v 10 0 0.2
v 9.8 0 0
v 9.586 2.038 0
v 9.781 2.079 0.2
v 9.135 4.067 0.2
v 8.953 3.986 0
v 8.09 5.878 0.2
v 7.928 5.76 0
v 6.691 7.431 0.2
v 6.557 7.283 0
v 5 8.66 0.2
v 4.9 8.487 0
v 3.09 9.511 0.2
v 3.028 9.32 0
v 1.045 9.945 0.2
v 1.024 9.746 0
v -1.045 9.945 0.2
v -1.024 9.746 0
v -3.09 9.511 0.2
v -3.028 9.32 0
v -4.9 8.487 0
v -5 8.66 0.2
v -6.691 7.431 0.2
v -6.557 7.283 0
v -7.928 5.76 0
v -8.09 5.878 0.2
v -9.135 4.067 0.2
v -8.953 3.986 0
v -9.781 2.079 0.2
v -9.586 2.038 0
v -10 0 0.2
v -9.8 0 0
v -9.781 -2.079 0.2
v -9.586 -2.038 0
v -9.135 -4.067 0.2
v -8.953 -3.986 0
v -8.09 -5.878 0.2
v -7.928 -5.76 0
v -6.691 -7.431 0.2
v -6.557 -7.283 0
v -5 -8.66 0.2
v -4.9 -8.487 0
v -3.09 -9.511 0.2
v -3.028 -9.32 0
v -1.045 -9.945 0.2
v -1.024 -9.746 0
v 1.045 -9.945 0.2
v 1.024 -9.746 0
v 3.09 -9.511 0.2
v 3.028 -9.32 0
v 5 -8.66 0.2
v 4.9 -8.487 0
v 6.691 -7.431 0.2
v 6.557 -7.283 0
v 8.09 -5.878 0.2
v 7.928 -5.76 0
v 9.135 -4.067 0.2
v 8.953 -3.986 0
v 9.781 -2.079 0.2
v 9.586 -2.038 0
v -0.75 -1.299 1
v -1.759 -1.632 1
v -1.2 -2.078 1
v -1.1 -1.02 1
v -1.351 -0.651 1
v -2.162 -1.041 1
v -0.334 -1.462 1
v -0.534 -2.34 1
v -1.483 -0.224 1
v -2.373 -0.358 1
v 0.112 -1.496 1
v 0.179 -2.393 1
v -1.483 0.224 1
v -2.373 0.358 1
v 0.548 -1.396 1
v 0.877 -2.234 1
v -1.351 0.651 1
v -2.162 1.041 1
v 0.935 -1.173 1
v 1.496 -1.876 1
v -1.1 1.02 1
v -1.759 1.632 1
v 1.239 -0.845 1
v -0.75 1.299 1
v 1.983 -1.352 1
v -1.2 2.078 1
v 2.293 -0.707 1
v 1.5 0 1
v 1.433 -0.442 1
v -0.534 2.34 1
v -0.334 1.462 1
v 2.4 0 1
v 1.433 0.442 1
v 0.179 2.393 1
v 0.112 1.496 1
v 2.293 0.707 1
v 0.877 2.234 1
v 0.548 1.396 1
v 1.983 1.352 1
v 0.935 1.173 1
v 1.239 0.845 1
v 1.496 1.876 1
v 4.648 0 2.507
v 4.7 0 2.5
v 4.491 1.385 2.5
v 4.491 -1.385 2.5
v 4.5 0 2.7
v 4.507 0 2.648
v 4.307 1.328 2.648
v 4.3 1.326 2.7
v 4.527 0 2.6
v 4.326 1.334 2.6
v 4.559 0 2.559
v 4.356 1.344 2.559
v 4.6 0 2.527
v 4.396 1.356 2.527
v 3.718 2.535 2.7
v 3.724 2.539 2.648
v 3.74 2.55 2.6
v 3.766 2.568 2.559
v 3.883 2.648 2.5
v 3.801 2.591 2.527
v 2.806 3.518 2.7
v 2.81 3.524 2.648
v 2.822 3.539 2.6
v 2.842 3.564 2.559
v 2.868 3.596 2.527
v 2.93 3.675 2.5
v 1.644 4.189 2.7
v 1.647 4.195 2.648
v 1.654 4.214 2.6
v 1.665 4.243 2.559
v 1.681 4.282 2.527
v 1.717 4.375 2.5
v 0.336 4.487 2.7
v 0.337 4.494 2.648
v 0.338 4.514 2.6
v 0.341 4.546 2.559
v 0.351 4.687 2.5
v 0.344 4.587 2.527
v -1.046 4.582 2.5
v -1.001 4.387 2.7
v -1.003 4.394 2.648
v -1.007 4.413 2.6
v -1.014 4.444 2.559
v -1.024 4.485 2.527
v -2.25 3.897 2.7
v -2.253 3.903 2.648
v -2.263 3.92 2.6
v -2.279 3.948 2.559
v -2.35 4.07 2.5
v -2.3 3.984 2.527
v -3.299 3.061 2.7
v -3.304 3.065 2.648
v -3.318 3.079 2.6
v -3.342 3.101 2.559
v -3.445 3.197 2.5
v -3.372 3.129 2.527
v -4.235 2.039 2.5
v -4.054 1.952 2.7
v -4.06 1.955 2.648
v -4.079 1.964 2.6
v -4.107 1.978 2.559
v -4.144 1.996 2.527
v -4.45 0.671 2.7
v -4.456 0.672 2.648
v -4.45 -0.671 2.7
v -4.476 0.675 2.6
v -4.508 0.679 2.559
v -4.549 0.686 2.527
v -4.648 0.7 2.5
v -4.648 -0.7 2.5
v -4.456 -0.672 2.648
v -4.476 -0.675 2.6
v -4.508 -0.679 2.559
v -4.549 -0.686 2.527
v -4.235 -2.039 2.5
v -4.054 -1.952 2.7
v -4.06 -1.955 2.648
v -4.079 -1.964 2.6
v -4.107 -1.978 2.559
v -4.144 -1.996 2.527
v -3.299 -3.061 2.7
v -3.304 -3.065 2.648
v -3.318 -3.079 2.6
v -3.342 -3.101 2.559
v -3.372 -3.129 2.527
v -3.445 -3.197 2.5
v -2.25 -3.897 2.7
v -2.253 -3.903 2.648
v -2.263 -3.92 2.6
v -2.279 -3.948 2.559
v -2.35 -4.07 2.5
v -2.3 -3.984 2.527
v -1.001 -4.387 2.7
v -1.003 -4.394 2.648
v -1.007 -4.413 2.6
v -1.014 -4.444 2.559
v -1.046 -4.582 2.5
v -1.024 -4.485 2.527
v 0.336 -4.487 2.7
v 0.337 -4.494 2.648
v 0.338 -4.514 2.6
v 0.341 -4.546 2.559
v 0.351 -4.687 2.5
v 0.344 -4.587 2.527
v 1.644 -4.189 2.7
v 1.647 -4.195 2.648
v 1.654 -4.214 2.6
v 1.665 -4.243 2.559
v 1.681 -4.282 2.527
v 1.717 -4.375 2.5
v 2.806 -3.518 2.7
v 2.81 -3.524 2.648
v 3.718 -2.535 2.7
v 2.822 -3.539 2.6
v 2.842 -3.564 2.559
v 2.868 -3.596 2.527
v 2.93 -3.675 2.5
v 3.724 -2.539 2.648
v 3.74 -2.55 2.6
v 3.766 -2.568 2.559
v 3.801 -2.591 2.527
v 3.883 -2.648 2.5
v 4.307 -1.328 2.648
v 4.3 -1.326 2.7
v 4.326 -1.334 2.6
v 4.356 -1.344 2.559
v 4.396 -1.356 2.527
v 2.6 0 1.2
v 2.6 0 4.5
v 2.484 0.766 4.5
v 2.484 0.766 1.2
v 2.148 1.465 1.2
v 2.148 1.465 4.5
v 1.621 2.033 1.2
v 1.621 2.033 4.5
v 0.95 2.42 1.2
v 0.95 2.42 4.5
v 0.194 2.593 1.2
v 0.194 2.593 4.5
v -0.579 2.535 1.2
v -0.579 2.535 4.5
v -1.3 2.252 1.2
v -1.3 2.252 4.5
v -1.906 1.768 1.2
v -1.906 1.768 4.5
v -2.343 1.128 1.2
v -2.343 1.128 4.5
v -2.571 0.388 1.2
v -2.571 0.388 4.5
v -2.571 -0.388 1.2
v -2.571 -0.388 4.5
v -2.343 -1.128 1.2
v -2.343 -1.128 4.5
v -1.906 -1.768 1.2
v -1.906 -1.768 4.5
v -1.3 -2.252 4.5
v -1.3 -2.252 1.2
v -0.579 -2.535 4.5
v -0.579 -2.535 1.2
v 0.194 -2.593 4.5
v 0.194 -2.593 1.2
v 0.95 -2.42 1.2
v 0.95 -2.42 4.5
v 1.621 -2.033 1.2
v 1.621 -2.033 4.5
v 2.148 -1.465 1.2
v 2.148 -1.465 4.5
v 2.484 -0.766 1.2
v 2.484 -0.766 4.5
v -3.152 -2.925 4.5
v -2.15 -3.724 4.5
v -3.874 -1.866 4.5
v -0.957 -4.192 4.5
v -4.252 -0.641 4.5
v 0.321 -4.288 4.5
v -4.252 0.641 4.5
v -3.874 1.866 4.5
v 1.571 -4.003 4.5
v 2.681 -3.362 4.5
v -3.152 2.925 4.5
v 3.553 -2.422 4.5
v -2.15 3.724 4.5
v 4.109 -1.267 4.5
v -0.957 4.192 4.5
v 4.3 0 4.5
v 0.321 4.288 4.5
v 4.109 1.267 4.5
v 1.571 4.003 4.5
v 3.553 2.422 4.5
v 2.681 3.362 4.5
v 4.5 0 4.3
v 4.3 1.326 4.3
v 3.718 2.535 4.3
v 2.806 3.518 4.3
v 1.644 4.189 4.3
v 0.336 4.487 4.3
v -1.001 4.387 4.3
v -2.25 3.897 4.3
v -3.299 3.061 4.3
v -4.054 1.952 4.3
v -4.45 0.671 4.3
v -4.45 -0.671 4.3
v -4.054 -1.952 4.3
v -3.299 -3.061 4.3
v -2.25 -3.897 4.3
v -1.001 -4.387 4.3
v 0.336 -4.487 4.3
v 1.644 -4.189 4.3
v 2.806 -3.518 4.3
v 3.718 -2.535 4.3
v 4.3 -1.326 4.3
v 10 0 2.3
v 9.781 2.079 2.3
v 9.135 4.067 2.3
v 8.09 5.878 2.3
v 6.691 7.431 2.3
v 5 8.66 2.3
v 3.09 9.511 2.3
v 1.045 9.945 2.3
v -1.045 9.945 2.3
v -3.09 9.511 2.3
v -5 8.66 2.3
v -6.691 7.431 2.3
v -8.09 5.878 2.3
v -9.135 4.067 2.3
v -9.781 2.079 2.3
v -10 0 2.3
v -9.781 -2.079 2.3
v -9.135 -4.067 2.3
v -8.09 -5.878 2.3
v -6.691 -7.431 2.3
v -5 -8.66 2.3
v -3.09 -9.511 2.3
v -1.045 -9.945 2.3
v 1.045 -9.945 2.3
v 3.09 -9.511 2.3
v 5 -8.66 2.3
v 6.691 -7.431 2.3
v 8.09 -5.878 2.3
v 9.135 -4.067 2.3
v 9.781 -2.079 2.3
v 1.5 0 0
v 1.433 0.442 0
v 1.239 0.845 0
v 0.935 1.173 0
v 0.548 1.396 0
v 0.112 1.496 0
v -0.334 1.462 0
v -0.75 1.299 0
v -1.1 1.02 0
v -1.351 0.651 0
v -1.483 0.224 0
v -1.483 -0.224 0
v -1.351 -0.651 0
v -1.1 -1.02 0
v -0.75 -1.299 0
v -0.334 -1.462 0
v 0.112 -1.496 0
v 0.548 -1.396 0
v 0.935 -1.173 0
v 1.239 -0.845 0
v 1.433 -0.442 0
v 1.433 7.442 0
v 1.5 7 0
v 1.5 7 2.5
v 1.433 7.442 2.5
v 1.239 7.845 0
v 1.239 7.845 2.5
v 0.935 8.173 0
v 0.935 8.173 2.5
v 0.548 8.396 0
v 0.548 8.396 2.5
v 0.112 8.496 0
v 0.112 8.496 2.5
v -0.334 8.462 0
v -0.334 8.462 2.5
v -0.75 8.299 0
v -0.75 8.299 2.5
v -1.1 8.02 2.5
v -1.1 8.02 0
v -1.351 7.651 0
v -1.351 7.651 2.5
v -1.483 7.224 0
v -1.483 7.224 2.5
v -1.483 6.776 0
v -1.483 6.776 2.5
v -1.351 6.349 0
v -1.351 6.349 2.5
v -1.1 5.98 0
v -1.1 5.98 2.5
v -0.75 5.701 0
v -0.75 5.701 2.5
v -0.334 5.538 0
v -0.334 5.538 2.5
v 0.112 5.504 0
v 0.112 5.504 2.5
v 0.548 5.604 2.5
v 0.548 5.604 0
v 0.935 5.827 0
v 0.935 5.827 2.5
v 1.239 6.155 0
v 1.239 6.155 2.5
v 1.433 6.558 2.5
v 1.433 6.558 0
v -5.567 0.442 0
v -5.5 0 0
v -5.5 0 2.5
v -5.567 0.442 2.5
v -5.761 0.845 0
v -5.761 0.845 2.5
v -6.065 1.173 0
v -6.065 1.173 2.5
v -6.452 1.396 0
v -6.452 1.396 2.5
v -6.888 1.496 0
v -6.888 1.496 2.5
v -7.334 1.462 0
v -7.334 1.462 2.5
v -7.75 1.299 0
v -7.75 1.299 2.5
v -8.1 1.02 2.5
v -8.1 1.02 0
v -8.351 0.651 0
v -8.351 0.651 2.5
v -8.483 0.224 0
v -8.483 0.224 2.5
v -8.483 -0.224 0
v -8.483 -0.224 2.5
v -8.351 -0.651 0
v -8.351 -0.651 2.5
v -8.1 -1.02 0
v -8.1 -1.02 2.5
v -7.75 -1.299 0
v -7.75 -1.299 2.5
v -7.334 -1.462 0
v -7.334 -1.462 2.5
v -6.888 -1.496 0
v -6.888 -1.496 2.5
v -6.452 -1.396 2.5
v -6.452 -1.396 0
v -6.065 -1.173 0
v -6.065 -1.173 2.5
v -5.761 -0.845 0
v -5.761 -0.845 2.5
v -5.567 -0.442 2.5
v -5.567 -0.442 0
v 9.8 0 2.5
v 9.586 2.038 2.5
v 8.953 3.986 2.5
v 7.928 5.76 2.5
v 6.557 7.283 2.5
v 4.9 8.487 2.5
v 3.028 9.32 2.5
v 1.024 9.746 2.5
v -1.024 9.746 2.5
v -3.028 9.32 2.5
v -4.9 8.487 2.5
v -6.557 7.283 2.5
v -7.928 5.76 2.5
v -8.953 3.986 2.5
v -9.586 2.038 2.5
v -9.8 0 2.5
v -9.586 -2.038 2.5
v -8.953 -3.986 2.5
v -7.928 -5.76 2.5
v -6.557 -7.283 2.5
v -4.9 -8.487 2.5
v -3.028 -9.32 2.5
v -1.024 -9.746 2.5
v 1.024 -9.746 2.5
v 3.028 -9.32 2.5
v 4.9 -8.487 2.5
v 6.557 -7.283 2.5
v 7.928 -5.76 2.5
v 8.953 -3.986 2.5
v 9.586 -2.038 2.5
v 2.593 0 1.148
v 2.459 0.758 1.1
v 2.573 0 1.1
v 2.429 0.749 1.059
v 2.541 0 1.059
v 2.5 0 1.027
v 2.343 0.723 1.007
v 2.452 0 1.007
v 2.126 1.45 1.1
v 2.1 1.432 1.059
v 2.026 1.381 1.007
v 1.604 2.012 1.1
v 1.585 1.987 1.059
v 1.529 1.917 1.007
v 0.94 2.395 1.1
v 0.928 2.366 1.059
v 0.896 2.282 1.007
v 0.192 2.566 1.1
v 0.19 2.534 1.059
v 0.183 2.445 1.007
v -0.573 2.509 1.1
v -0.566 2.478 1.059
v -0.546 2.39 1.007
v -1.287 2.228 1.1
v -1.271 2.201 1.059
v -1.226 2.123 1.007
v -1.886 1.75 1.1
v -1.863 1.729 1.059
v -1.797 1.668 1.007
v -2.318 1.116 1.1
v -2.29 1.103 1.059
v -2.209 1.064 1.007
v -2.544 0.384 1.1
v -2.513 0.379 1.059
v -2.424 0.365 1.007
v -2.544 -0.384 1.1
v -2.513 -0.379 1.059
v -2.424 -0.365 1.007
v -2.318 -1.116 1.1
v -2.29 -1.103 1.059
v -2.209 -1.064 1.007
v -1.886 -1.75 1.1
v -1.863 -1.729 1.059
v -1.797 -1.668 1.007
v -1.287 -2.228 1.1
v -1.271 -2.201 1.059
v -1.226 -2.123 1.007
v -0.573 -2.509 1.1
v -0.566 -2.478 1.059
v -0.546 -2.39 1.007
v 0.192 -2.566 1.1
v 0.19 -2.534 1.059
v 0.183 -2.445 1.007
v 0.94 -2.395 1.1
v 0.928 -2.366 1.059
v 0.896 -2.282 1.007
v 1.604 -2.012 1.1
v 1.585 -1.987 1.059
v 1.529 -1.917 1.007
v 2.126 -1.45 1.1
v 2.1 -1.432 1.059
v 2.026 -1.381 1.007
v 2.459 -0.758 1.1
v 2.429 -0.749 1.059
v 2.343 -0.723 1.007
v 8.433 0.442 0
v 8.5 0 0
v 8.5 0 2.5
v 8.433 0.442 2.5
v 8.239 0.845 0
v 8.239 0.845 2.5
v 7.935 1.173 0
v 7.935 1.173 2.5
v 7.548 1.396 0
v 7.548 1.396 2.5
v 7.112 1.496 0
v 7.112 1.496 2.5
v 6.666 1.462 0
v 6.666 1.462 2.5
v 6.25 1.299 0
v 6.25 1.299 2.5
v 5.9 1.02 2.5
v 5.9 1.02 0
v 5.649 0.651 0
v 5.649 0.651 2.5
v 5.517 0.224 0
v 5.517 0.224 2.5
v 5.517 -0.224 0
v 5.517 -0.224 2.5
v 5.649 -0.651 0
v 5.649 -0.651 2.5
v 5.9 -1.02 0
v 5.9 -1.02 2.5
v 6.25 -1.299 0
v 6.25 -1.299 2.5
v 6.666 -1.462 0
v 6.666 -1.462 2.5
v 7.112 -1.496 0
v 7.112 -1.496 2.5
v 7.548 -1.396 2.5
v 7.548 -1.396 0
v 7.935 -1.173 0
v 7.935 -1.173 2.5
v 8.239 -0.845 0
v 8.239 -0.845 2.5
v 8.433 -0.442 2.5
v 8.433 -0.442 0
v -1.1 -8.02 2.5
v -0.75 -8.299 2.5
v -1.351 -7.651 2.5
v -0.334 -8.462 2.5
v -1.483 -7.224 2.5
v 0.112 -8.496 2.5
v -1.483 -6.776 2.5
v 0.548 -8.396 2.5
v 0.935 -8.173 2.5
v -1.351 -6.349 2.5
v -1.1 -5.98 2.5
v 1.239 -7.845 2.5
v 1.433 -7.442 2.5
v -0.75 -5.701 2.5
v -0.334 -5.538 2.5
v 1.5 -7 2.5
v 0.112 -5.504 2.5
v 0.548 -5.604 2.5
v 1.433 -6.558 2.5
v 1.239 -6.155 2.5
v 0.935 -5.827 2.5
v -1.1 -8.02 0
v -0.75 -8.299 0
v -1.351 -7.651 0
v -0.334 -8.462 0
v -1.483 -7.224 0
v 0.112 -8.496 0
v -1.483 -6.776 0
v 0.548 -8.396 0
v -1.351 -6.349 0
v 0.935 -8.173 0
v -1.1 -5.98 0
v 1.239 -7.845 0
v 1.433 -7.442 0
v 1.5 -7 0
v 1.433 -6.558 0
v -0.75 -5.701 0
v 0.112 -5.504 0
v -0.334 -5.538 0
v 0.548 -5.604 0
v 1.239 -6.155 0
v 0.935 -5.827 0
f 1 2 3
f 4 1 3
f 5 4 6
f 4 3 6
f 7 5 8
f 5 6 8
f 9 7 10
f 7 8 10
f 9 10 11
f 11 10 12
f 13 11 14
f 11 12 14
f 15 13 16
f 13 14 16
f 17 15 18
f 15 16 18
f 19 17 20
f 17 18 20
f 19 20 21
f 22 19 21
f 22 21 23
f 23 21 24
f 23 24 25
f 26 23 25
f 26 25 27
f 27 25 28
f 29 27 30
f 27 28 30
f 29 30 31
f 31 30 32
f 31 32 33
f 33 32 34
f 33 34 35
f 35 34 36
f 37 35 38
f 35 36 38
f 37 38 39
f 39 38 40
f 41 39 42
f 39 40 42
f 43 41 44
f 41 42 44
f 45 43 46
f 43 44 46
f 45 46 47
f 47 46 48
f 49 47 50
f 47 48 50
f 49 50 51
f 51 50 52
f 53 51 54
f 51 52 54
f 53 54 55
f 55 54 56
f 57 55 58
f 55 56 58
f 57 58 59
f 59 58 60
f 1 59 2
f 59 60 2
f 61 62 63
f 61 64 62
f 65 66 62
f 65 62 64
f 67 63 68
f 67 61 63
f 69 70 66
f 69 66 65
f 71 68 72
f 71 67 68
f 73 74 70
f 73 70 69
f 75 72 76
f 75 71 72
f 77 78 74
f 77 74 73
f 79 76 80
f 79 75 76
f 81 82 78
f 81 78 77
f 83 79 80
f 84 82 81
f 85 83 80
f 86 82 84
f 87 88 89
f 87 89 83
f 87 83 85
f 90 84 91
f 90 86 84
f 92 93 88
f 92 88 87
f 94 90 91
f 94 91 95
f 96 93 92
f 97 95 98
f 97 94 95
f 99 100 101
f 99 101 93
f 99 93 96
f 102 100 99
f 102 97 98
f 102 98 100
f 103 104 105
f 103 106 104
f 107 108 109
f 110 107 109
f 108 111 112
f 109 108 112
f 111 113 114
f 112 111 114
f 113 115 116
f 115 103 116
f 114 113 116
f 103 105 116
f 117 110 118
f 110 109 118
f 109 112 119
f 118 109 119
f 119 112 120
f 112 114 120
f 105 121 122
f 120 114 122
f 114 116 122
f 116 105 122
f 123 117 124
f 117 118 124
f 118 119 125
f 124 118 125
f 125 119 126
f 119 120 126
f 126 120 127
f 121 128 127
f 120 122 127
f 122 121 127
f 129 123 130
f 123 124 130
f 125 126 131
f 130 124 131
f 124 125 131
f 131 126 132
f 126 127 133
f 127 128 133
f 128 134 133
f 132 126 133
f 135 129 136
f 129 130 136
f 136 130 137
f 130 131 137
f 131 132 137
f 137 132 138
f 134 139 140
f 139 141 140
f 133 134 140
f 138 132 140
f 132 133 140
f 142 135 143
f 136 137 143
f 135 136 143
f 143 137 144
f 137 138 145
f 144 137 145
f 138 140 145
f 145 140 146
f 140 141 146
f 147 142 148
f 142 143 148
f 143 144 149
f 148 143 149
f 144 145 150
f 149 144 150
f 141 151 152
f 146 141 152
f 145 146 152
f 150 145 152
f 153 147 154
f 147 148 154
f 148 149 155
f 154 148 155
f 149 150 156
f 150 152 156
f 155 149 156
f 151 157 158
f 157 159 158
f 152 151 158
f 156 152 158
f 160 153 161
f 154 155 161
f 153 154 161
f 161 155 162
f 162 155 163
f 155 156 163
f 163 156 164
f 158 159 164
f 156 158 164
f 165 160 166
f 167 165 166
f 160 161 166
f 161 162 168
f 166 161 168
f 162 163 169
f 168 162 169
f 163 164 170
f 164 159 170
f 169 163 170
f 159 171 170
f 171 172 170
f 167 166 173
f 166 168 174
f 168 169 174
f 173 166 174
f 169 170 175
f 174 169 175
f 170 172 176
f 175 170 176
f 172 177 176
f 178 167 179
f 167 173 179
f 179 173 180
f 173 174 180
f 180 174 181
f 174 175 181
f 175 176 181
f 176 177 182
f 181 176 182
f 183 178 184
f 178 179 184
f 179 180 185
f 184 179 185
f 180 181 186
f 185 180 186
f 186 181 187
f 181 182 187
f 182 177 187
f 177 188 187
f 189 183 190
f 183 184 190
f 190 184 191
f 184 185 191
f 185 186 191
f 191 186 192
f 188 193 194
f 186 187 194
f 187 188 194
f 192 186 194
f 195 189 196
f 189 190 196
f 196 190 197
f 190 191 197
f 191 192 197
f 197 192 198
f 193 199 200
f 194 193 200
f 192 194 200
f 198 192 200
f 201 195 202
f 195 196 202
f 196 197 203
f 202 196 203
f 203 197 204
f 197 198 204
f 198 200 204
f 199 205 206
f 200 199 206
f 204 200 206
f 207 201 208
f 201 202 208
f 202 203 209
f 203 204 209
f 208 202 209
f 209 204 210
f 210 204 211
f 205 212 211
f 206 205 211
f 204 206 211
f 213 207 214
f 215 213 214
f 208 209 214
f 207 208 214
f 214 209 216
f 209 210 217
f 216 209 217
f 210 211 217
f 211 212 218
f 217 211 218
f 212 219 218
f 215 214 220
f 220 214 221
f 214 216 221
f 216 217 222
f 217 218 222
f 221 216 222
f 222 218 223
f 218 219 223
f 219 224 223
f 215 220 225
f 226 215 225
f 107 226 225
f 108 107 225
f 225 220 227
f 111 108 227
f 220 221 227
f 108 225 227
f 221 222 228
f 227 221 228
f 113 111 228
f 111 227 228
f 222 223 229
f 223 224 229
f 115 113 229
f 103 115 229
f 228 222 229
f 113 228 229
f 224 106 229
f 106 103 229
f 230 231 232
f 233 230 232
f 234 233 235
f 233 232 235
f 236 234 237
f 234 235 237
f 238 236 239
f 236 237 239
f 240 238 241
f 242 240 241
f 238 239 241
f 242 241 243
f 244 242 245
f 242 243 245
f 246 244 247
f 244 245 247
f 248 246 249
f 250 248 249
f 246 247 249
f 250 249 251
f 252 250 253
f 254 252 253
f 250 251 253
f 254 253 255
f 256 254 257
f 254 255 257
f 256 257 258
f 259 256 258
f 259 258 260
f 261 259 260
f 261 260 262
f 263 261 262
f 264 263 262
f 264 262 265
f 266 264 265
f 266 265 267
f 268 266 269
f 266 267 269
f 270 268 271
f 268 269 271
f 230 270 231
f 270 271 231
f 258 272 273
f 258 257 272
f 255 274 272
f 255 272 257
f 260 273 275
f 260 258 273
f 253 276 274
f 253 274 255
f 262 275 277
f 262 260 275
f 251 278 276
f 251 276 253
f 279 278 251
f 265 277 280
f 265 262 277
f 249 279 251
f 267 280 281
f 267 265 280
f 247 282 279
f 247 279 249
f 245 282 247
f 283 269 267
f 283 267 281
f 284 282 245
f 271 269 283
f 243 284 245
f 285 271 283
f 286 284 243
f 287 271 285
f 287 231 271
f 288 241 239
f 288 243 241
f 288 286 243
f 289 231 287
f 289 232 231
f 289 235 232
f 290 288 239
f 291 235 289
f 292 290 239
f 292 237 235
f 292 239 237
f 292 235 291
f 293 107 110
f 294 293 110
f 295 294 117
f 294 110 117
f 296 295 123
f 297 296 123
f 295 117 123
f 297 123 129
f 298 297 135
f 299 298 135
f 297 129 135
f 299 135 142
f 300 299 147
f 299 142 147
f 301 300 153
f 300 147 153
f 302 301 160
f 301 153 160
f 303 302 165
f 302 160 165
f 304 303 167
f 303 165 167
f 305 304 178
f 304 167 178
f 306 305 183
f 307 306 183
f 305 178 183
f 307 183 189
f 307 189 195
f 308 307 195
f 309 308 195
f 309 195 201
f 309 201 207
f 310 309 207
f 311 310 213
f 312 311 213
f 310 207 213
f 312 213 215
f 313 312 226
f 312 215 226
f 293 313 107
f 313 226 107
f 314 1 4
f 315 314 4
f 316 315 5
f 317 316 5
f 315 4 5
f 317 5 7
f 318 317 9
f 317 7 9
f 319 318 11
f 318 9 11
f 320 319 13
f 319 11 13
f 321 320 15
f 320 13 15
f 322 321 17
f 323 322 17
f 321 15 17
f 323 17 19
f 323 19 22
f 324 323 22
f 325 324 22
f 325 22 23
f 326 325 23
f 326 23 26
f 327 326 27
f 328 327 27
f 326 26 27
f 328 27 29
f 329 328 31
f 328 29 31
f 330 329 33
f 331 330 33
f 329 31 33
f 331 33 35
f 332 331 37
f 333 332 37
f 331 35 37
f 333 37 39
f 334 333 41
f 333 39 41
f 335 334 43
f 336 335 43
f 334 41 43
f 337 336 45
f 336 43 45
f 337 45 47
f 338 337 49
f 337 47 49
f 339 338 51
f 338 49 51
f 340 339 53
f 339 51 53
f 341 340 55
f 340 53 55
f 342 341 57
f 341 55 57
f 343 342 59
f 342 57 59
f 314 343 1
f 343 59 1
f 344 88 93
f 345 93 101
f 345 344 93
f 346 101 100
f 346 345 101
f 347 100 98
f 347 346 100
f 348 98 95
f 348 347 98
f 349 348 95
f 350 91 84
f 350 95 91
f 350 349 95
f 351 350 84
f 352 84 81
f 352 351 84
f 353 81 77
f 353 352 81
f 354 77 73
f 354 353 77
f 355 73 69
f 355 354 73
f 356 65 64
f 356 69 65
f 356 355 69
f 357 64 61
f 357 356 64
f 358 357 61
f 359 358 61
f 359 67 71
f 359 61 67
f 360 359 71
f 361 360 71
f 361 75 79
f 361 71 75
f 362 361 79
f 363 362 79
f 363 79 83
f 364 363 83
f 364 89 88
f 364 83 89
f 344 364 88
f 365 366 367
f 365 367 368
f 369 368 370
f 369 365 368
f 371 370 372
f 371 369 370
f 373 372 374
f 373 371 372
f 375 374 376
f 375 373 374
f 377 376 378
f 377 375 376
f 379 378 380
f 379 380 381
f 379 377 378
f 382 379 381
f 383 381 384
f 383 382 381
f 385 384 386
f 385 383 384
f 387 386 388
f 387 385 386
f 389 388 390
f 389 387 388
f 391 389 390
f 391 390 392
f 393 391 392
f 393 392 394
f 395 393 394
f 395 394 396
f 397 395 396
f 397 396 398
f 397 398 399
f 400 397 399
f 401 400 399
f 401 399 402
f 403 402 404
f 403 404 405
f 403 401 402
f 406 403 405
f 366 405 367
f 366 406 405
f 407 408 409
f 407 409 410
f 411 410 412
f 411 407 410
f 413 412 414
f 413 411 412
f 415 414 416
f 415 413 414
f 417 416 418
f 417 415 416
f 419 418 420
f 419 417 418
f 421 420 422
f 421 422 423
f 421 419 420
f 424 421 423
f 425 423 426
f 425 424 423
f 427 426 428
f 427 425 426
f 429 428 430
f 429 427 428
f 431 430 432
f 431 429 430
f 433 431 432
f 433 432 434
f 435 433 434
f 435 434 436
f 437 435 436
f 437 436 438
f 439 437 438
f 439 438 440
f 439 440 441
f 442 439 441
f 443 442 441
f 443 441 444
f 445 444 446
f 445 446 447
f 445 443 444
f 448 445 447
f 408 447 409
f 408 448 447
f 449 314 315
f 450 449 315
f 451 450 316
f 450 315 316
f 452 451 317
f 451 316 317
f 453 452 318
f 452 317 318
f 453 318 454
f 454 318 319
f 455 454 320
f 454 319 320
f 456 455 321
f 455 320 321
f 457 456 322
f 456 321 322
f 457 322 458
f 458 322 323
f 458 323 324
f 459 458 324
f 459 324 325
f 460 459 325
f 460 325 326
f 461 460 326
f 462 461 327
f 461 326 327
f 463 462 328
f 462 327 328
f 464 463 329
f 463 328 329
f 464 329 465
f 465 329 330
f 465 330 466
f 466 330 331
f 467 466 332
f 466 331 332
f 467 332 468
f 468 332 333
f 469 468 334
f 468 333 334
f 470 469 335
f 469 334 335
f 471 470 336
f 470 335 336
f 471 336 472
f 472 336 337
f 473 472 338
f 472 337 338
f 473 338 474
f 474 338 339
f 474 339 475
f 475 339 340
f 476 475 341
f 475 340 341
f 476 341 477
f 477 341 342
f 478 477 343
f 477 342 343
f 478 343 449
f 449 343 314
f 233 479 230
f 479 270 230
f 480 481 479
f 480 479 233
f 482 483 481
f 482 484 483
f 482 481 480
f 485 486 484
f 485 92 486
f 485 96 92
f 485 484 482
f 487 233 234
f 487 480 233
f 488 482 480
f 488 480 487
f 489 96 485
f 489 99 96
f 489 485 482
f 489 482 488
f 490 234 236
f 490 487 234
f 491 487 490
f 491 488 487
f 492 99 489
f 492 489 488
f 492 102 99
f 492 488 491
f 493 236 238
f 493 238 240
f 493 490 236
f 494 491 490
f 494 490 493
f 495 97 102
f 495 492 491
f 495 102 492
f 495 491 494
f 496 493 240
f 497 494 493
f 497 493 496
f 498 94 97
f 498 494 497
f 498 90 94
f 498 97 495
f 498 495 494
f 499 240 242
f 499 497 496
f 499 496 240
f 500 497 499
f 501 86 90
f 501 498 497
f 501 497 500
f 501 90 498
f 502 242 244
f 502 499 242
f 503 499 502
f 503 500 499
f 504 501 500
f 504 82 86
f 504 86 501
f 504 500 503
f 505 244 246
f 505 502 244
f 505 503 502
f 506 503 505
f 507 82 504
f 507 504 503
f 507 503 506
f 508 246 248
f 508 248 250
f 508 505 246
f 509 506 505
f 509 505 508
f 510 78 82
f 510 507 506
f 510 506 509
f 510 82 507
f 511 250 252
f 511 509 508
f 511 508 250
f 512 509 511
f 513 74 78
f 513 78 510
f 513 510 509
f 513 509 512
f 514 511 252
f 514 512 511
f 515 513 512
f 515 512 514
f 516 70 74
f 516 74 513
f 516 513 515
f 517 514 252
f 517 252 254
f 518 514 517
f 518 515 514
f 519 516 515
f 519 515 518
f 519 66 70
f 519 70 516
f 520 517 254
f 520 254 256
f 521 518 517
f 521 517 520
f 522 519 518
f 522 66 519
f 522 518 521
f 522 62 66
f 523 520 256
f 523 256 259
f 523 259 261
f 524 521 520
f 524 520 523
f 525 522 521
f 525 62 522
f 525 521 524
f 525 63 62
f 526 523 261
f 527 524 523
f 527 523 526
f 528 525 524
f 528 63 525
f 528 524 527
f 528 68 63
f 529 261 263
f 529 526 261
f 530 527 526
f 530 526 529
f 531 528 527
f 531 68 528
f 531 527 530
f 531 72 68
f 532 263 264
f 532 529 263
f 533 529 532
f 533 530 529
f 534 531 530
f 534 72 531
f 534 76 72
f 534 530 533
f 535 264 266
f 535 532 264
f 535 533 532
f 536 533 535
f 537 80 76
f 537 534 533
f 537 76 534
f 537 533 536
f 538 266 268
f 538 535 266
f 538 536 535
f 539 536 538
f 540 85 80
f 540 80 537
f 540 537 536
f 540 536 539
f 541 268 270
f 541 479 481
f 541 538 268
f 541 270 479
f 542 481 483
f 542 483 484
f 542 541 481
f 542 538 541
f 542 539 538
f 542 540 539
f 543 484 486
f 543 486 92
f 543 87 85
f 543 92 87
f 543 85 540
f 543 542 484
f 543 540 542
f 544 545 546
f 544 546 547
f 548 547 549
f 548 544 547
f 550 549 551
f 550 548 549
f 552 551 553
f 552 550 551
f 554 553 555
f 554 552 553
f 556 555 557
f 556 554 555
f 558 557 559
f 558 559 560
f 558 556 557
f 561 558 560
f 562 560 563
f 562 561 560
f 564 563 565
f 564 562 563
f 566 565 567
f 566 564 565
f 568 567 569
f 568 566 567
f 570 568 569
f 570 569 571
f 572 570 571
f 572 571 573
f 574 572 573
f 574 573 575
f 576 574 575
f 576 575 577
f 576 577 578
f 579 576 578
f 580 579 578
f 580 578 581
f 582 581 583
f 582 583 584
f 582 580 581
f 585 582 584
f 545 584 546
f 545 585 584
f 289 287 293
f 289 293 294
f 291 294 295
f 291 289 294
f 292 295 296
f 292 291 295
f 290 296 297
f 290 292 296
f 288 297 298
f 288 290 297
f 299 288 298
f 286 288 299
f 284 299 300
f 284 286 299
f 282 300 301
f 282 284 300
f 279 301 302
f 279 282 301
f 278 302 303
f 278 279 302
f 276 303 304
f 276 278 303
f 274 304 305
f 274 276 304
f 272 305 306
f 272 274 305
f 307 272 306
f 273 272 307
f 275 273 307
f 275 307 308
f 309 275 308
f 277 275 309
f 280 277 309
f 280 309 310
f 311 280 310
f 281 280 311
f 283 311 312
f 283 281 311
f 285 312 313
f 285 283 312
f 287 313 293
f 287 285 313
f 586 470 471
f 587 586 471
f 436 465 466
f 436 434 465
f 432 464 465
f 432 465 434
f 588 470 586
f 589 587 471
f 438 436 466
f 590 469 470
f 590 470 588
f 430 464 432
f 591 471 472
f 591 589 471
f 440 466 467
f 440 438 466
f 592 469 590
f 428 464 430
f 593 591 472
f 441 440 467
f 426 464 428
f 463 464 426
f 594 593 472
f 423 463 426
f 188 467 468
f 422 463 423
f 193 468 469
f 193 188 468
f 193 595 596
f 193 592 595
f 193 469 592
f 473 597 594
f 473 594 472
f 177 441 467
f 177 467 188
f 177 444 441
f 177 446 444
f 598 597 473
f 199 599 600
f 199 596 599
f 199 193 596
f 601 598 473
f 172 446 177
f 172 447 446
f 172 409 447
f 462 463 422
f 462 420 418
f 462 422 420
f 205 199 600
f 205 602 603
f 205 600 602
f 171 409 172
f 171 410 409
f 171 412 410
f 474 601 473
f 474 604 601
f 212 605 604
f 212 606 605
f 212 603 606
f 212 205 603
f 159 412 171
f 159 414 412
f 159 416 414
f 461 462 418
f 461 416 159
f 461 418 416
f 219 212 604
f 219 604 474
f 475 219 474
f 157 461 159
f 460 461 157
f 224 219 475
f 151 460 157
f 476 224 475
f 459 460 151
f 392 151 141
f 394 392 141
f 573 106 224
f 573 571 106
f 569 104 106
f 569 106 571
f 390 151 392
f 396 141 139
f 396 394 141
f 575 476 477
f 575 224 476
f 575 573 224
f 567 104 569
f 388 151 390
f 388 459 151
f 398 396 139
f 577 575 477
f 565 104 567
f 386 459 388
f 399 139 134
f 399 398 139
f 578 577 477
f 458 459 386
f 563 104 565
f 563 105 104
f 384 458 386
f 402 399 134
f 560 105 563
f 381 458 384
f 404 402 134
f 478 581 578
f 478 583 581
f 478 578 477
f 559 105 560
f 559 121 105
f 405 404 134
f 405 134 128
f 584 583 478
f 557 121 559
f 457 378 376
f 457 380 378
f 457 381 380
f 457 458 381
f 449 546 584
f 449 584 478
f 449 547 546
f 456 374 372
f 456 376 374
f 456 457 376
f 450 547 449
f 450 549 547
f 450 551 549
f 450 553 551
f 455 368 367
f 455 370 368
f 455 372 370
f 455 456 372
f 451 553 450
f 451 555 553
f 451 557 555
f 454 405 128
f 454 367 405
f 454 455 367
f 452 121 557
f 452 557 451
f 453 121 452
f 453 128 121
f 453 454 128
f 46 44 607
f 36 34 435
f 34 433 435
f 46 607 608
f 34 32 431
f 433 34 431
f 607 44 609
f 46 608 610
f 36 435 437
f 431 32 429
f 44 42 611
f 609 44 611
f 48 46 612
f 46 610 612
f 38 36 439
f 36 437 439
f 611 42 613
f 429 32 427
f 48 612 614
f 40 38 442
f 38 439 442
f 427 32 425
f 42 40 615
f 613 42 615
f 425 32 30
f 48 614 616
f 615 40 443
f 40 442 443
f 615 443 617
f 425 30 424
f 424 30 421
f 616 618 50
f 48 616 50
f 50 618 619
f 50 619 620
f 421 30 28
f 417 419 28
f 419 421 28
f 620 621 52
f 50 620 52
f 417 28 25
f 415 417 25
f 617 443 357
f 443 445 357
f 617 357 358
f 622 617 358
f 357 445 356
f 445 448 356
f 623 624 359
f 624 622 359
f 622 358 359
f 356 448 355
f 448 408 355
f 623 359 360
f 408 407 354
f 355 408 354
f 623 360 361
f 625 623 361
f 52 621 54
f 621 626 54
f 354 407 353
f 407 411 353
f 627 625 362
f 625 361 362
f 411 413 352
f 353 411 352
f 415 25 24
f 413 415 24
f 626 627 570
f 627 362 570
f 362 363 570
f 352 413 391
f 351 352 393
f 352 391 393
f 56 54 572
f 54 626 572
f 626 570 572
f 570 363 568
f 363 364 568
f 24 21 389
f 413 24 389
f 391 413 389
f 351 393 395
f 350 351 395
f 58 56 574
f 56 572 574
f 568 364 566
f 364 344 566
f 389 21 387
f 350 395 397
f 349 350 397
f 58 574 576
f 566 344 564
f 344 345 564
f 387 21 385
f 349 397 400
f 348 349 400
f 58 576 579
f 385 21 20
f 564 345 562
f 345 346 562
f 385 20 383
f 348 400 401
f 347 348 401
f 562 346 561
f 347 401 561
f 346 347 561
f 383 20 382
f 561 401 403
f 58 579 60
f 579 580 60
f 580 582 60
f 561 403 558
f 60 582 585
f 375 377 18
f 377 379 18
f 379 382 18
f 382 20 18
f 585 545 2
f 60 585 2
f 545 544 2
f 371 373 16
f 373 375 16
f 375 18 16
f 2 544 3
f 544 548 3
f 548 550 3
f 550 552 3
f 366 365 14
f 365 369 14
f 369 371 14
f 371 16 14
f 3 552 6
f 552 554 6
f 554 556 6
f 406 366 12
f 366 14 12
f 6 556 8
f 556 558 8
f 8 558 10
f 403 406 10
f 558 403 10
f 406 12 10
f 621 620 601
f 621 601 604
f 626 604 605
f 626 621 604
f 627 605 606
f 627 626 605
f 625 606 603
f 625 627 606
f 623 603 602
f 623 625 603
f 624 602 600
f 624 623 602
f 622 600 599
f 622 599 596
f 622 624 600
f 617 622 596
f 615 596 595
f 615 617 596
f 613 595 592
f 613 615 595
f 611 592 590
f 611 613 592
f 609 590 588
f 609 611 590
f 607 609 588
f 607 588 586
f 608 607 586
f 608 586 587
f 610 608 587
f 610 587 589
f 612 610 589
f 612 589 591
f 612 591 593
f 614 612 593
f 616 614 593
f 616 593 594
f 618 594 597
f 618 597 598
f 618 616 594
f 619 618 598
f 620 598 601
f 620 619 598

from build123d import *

# Parameters (mm, degrees)
SKETCH1_R           = 10
SKETCH1_R_2         = 1.5
BOSS_EXTRUDE1_DEPTH = 2.5
SKETCH2_R           = 4.5
BOSS_EXTRUDE2_DEPTH = 2
SKETCH3_R           = 2.6
CUT_EXTRUDE1_DEPTH  = 3.5
CHAMFER1_SIZE       = 0.2
FILLET1_R           = 0.2


with BuildPart() as part:
    # Sketch1 → Boss-Extrude1 (new body)
    with BuildSketch(Plane.XY):
        Circle(SKETCH1_R)
        with Locations((0, 7)):
            Circle(SKETCH1_R_2, mode=Mode.SUBTRACT)
        with Locations((7, 0)):
            Circle(SKETCH1_R_2, mode=Mode.SUBTRACT)
        with Locations((0, -7)):
            Circle(SKETCH1_R_2, mode=Mode.SUBTRACT)
        with Locations((-7, 0)):
            Circle(SKETCH1_R_2, mode=Mode.SUBTRACT)
        Circle(SKETCH1_R_2, mode=Mode.SUBTRACT)
    extrude(amount=BOSS_EXTRUDE1_DEPTH)

    # Sketch2 → Boss-Extrude2 (add)
    with BuildSketch(Plane.XY.offset(2.5)):
        Circle(SKETCH2_R)
    extrude(amount=BOSS_EXTRUDE2_DEPTH)

    # Sketch3 → Cut-Extrude1 (cut)
    with BuildSketch(Plane.XY.offset(4.5)):
        Circle(SKETCH3_R)
    extrude(amount=-CUT_EXTRUDE1_DEPTH, mode=Mode.SUBTRACT)

    # Chamfer1
    chamfer1_edges = [part.edges().sort_by_distance(p)[0] for p in [
        (-10, 0, 0),
        (-4.5, 0, 4.5),
        (-10, 0, 2.5),
    ]]
    chamfer(chamfer1_edges, length=CHAMFER1_SIZE)

    # Fillet1
    fillet1_edges = [part.edges().sort_by_distance(p)[0] for p in [
        (-4.5, 0, 2.5),
        (-2.6, 0, 1),
    ]]
    fillet(fillet1_edges, radius=FILLET1_R)


solid = part.part
